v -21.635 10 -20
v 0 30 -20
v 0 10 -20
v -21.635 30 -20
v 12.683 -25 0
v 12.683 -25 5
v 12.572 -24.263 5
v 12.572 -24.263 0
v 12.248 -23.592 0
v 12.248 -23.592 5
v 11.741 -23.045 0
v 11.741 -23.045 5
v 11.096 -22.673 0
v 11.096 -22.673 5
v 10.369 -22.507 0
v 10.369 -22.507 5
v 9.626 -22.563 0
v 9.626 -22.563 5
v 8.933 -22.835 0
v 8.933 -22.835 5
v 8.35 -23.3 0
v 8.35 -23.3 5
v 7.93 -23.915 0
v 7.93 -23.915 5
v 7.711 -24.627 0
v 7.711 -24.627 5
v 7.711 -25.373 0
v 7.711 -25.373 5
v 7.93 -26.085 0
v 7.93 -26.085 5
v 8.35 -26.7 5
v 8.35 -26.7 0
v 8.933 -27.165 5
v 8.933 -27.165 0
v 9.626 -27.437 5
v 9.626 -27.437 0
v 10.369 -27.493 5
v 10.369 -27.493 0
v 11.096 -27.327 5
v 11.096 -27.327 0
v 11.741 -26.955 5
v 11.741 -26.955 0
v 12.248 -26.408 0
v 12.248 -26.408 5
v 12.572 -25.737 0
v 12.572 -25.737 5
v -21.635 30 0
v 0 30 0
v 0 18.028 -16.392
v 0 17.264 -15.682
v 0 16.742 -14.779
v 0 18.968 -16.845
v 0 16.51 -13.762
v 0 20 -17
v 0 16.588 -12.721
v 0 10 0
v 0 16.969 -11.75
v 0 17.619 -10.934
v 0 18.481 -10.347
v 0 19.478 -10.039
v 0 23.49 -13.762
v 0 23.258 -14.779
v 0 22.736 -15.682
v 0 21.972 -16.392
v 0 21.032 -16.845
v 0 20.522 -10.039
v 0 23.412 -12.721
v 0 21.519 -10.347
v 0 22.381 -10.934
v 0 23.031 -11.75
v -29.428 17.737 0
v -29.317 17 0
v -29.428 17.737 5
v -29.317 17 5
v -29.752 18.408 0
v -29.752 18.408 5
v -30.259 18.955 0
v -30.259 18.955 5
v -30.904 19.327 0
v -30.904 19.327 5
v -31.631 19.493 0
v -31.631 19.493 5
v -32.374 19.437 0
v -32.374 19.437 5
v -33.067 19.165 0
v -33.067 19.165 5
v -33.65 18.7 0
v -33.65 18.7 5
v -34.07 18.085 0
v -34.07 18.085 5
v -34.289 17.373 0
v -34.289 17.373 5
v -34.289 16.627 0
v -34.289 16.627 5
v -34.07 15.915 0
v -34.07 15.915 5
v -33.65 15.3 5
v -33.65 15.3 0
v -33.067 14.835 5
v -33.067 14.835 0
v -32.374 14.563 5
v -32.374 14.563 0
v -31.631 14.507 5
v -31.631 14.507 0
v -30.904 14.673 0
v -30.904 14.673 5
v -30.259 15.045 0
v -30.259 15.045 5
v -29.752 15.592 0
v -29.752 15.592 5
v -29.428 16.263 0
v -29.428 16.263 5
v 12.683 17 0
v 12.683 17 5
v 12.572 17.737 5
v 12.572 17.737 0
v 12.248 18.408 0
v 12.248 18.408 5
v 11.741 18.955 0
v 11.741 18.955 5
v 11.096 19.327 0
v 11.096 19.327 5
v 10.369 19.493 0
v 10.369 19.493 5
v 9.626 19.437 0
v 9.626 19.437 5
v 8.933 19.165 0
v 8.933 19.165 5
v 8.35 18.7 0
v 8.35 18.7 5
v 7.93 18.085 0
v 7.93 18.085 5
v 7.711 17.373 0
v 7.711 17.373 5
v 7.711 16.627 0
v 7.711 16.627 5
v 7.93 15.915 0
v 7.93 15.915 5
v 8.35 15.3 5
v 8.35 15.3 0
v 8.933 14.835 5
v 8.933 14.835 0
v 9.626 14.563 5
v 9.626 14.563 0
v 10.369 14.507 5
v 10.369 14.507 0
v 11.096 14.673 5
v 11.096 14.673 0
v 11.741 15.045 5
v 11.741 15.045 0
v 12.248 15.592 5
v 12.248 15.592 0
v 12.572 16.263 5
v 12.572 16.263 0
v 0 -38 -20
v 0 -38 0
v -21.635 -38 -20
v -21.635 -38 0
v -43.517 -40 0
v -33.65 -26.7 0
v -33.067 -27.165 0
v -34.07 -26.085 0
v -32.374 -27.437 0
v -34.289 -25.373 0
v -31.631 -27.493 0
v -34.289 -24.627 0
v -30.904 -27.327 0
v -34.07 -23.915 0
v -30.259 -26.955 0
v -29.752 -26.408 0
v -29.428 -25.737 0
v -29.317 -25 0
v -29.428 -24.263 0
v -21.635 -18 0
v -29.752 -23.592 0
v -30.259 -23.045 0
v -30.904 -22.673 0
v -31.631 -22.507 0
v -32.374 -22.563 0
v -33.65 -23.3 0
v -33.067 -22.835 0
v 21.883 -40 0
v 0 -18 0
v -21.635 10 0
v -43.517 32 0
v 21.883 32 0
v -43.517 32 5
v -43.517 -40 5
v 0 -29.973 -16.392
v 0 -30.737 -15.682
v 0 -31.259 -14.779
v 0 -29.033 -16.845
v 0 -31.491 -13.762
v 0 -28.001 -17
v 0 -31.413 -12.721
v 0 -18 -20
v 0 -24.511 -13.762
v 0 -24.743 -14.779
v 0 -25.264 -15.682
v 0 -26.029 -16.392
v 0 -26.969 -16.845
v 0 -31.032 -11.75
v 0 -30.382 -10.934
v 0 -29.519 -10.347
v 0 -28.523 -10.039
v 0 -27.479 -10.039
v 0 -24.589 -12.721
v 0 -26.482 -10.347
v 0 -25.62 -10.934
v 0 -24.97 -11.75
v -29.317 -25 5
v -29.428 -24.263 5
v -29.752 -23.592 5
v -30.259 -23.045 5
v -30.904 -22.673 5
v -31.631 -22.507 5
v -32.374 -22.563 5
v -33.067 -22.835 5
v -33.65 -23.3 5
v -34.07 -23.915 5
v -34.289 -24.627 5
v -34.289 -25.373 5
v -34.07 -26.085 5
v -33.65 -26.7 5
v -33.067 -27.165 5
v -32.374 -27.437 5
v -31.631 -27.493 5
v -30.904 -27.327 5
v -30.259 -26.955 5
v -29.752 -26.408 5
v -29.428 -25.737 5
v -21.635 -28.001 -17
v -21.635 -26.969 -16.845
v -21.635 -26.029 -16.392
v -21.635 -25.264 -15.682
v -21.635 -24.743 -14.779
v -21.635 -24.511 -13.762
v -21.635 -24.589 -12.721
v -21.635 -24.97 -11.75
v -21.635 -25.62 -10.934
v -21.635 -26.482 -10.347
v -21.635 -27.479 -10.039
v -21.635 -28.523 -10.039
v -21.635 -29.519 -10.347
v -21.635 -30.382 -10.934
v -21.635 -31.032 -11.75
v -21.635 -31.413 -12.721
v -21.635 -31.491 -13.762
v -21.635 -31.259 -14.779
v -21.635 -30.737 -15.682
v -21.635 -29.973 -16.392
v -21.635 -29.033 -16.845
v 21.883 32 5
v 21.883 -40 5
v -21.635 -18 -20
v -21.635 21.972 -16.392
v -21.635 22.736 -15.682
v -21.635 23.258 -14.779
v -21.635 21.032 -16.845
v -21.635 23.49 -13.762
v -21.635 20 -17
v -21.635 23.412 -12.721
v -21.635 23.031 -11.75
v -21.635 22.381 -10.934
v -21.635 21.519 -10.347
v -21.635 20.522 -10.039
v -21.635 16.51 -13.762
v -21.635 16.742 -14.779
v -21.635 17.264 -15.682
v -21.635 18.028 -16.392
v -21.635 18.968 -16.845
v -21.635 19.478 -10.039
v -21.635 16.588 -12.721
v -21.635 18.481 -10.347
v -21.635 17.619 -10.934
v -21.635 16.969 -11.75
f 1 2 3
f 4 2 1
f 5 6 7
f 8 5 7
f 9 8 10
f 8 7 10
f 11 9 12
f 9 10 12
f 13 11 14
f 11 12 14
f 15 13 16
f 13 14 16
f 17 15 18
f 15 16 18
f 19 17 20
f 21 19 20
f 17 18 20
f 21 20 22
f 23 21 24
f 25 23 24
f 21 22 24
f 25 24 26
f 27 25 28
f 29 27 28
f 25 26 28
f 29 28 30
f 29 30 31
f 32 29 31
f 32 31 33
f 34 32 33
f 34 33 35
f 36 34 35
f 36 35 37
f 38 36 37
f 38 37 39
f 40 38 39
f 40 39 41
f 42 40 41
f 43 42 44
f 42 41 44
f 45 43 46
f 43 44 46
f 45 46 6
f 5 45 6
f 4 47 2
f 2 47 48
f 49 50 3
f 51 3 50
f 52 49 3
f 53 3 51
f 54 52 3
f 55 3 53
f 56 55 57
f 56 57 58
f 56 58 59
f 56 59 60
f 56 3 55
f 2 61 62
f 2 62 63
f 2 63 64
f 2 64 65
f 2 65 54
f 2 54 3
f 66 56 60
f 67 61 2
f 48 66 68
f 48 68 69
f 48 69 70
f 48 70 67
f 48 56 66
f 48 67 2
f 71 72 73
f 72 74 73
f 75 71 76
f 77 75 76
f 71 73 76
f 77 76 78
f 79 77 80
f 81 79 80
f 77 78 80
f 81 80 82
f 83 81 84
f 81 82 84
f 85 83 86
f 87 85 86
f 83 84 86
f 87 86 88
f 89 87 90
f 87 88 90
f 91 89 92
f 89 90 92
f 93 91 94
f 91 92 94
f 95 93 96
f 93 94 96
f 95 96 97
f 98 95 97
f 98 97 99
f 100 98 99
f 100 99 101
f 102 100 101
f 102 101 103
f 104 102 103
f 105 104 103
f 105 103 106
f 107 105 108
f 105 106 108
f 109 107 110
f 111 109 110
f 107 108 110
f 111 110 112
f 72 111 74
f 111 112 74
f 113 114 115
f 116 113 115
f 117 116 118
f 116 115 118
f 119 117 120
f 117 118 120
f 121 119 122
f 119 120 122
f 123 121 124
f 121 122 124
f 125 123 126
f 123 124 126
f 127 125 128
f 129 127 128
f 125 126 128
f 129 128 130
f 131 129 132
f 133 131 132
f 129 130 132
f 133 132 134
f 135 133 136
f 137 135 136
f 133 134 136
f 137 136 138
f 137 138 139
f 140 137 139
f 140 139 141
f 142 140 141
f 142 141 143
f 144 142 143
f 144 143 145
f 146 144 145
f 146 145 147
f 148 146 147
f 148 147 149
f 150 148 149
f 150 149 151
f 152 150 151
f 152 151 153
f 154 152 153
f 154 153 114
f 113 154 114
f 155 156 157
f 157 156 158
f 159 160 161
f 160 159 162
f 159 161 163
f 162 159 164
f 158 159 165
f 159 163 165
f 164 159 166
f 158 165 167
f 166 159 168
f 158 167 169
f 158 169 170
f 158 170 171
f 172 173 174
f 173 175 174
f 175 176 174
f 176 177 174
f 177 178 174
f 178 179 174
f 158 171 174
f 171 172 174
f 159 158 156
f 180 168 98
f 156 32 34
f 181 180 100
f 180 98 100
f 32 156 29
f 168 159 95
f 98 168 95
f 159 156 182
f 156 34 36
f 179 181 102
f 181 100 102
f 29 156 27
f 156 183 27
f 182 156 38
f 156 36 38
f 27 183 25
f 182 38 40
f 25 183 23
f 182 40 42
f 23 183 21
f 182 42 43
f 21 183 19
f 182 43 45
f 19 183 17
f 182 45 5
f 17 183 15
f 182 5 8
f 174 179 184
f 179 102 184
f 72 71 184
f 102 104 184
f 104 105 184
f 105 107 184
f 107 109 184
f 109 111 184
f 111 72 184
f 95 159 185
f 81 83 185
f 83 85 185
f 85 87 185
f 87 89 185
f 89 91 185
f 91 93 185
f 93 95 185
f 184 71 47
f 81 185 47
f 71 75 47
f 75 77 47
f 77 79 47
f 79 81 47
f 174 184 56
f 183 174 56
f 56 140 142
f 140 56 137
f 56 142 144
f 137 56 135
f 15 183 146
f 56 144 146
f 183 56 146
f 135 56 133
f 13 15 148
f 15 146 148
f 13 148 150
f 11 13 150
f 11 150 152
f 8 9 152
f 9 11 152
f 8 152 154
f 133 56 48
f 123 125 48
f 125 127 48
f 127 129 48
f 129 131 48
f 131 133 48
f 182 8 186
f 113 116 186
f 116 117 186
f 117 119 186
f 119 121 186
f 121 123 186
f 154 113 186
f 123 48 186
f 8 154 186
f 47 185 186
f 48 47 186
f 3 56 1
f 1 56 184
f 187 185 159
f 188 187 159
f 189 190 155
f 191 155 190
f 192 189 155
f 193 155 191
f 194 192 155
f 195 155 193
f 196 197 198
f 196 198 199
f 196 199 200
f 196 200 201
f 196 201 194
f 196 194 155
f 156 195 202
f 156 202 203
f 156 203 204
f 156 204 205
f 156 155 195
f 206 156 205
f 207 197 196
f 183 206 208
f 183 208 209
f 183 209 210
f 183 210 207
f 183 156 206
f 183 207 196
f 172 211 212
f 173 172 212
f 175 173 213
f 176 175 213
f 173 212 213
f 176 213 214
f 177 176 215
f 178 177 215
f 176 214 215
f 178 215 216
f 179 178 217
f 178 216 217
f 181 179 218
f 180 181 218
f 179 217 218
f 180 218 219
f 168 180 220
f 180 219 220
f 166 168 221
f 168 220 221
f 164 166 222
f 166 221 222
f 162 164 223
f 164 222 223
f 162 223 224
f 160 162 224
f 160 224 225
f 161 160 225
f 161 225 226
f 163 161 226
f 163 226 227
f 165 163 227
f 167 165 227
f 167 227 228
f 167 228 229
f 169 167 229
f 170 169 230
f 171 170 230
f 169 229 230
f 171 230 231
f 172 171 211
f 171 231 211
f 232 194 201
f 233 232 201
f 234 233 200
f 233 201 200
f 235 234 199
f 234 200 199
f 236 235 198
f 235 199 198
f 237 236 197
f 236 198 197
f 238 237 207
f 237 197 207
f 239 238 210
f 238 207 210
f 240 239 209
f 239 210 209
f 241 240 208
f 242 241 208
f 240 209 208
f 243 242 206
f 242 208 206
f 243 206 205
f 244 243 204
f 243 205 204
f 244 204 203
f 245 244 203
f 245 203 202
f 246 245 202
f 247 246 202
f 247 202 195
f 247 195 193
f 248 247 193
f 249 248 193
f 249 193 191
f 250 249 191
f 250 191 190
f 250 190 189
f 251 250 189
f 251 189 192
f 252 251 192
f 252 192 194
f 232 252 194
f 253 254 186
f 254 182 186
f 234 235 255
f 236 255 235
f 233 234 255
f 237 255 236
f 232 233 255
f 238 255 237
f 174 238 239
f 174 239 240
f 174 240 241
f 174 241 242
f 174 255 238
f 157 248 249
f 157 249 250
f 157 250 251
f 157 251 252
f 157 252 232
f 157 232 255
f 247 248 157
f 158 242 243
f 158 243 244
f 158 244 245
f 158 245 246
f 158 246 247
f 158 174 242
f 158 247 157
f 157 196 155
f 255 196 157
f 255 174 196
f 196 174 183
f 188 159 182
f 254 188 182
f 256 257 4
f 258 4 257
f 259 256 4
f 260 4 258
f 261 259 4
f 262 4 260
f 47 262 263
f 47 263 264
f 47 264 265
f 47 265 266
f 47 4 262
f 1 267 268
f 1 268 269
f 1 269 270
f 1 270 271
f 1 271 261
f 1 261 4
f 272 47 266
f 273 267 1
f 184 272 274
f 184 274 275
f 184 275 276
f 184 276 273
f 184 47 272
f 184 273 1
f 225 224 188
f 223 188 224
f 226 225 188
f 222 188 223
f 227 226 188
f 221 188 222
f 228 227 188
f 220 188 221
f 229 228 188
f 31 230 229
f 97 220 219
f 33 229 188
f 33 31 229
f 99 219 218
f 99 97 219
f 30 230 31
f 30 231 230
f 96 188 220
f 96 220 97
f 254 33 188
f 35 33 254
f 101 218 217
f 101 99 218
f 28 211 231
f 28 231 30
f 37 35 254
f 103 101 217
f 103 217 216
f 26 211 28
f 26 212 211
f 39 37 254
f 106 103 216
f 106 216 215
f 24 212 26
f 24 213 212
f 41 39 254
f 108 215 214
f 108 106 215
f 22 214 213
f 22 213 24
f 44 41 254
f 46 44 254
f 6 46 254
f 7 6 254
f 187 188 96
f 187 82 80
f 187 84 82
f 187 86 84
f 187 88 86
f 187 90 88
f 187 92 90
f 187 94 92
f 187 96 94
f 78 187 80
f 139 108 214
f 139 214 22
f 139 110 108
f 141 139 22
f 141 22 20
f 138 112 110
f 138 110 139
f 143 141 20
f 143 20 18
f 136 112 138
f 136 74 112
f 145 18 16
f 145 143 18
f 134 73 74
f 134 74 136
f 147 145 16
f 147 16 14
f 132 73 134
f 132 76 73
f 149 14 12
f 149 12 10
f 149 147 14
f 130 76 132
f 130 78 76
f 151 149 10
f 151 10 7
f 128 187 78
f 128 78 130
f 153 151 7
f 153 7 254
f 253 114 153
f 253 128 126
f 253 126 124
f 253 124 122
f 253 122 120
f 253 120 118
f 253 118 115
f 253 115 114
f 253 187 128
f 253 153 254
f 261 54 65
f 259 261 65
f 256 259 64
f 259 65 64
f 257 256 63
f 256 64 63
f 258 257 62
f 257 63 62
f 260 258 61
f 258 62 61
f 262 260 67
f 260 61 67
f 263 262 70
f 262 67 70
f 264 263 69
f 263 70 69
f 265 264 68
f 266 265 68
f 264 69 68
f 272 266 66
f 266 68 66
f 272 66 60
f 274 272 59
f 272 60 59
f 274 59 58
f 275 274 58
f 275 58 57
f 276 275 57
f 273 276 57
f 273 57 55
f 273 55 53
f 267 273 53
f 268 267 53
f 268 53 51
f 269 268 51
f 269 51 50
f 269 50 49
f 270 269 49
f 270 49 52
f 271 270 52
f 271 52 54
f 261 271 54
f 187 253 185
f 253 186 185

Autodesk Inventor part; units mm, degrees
ref_plane "YZ Plane" through (0, 0, 0) normal (1, 0, 0) x (0, 1, 0)
ref_plane "XZ Plane" through (0, 0, 0) normal (0, 1, 0) x (-1, 0, 0)
ref_plane "XY Plane" through (0, 0, 0) normal (0, 0, 1) x (1, 0, 0)
sketch "Sketch1" plane through (0, 0, 0) normal (0, 0, 1) x (1, 0, 0)
  line L0 (0, 0) -> (36.8826, 0) projected
  line L1 (36.8826, 0) -> (36.8826, 40) projected
  line L2 (0, 40) -> (36.8826, 40) projected
  line L3 (0, 0) -> (0, 40) projected
  line L4 (-21.6348, 40) -> (-58.5174, 40) projected
  line L5 (-58.5174, 40) -> (-58.5174, 0) projected
  line L6 (-21.6348, 0) -> (-58.5174, 0) projected
  line L7 (-21.6348, 40) -> (-21.6348, 0) projected
  line L8 (-21.6348, -8) -> (-58.5174, -8) projected
  line L9 (-58.5174, -8) -> (-58.5174, -48) projected
  line L10 (-21.6348, -48) -> (-58.5174, -48) projected
  line L11 (-21.6348, -8) -> (-21.6348, -48) projected
  line L12 (0, -48) -> (36.8826, -48) projected
  line L13 (36.8826, -48) -> (36.8826, -8) projected
  line L14 (0, -8) -> (36.8826, -8) projected
  line L15 (0, -48) -> (0, -8) projected
  line L16 (21.8826, 32) -> (-43.5174, 32)
  line L17 (-43.5174, 32) -> (-43.5174, -40)
  line L18 (-43.5174, -40) -> (21.8826, -40)
  line L19 (21.8826, -40) -> (21.8826, 32)
  dimension "d0" = 8
  dimension "d1" = 8
  dimension "d2" = 15
  dimension "d3" = 15
extrude "Extrusion1" add sketch "Sketch1" along normal blind 5 contours L3 L16 L19 L0 | L0 L19 L14 L15 L18 L11 L8 L17 L6 L7 L16 L3 | L19 L18 L15 L14 | L7 L6 L17 L16 | L18 L17 L8 L11
sketch "Sketch2" plane through (0, 0, 0) normal (0, 0, -1) x (-1, 0, 0)
  line L0 (0, -48) -> (-36.8826, -48) projected
  line L1 (-36.8826, -48) -> (-36.8826, -8) projected
  line L2 (0, -8) -> (-36.8826, -8) projected
  line L3 (0, -48) -> (0, -8) projected
  line L4 (0, 0) -> (-36.8826, 0) projected
  line L5 (-36.8826, 0) -> (-36.8826, 40) projected
  line L6 (0, 40) -> (-36.8826, 40) projected
  line L7 (0, 0) -> (0, 40) projected
  line L8 (21.6348, 40) -> (58.5174, 40) projected
  line L9 (58.5174, 40) -> (58.5174, 0) projected
  line L10 (21.6348, 0) -> (58.5174, 0) projected
  line L11 (21.6348, 40) -> (21.6348, 0) projected
  line L12 (21.6348, -8) -> (58.5174, -8) projected
  line L13 (58.5174, -8) -> (58.5174, -48) projected
  line L14 (21.6348, -48) -> (58.5174, -48) projected
  line L15 (21.6348, -8) -> (21.6348, -48) projected
  line L16 (0, -38) -> (21.6348, -38)
  line L17 (21.6348, -38) -> (21.6348, -18)
  line L18 (21.6348, -18) -> (0, -18)
  line L19 (0, -18) -> (0, -38)
  line L20 (0, 10) -> (21.6348, 10)
  line L21 (21.6348, 10) -> (21.6348, 30)
  line L22 (21.6348, 30) -> (0, 30)
  line L23 (0, 30) -> (0, 10)
  point P0 (0, 30)
  point P1 (0, -18)
  dimension "d6" = 20
  dimension "d7" = 20
  dimension "d8" = 10
  dimension "d9" = 10
extrude "Extrusion2" add sketch "Sketch2" along normal blind 20 contours L3 L18 L15 L16 | L7 L22 L11 L20
sketch "Sketch3" plane through (0, 0, 5) normal (0, 0, 1) x (1, 0, 0)
  circle A0 centre (10.1826, 17) radius 2.5
  circle A1 centre (-31.8174, 17) radius 2.5
  circle A2 centre (10.1826, -25) radius 2.5
  circle A3 centre (-31.8174, -25) radius 2.5
  line L0 (21.8826, -40) -> (21.8826, 32) projected
  line L1 (-43.5174, 32) -> (-43.5174, -40) projected
  line L2 (10.1826, 17) -> (-31.8174, 17)
  line L3 (10.1826, -25) -> (-31.8174, -25)
  line L4 (21.8826, 32) -> (-43.5174, 32) projected
  line L5 (-43.5174, -40) -> (21.8826, -40) projected
  point P0 (0, 0)
  point P1 (-10.8174, 17)
  point P2 (-10.8174, 32)
  point P3 (-10.8174, -25)
  point P4 (-10.8174, -40)
  dimension "d12" = 5
  dimension "d13" = 5
  dimension "d14" = 5
  dimension "d15" = 5
  dimension "d16" = 42
  dimension "d17" = 42
  dimension "d18" = 15
  dimension "d19" = 15
extrude "Extrusion3" cut sketch "Sketch3" against normal through all contours A0 | A1 | A2 | A3
sketch "Sketch4" plane through (0, -38, 0) normal (1, 0, 0) x (0, 0, -1)
  arc A0 (2.5, 58) -> (5, 53.6699) centre (7.5, 58) ccw projected
  arc A1 (5, 53.6699) -> (10, 53.6699) centre (7.5, 58) ccw projected
  arc A2 (10, 53.6699) -> (12.5, 58) centre (7.5, 58) ccw projected
  arc A3 (12.5, 58) -> (10, 62.3301) centre (7.5, 58) ccw projected
  arc A4 (10, 62.3301) -> (5, 62.3301) centre (7.5, 58) ccw projected
  arc A5 (5, 62.3301) -> (2.5, 58) centre (7.5, 58) ccw projected
  circle A6 centre (7.5, 58) radius 3.1 projected
  arc A7 (2.3201, 9.9991) -> (4.8201, 5.669) centre (7.3201, 9.9991) ccw projected
  arc A8 (4.8201, 5.669) -> (9.8201, 5.669) centre (7.3201, 9.9991) ccw projected
  arc A9 (9.8201, 5.669) -> (12.3201, 9.9991) centre (7.3201, 9.9991) ccw projected
  arc A10 (12.3201, 9.9991) -> (9.8201, 14.3292) centre (7.3201, 9.9991) ccw projected
  arc A11 (9.8201, 14.3292) -> (4.8201, 14.3292) centre (7.3201, 9.9991) ccw projected
  arc A12 (4.8201, 14.3292) -> (2.3201, 9.9991) centre (7.3201, 9.9991) ccw projected
  circle A13 centre (7.3201, 9.9991) radius 3.1 projected
  circle A14 centre (13.5, 58) radius 3.5
  circle A15 centre (13.5, 9.9991) radius 3.5
  line L0 (0, -2) -> (0, 70) projected
  point P0 (0, 38)
  dimension "d24" = 7
  dimension "d25" = 7
  dimension "d26" = 10
  dimension "d27" = 10
extrude "Extrusion5" cut sketch "Sketch4" against normal through all contours A14 A6 A3 A2 | A2 A3 A14 | A14 A6 | A15 A13 A10 A9 | A9 A10 A15 | A15 A13 picked at (10.2115, 57.6094) picked at (10.1547, 9.9991)
properties part number "bearing support"
